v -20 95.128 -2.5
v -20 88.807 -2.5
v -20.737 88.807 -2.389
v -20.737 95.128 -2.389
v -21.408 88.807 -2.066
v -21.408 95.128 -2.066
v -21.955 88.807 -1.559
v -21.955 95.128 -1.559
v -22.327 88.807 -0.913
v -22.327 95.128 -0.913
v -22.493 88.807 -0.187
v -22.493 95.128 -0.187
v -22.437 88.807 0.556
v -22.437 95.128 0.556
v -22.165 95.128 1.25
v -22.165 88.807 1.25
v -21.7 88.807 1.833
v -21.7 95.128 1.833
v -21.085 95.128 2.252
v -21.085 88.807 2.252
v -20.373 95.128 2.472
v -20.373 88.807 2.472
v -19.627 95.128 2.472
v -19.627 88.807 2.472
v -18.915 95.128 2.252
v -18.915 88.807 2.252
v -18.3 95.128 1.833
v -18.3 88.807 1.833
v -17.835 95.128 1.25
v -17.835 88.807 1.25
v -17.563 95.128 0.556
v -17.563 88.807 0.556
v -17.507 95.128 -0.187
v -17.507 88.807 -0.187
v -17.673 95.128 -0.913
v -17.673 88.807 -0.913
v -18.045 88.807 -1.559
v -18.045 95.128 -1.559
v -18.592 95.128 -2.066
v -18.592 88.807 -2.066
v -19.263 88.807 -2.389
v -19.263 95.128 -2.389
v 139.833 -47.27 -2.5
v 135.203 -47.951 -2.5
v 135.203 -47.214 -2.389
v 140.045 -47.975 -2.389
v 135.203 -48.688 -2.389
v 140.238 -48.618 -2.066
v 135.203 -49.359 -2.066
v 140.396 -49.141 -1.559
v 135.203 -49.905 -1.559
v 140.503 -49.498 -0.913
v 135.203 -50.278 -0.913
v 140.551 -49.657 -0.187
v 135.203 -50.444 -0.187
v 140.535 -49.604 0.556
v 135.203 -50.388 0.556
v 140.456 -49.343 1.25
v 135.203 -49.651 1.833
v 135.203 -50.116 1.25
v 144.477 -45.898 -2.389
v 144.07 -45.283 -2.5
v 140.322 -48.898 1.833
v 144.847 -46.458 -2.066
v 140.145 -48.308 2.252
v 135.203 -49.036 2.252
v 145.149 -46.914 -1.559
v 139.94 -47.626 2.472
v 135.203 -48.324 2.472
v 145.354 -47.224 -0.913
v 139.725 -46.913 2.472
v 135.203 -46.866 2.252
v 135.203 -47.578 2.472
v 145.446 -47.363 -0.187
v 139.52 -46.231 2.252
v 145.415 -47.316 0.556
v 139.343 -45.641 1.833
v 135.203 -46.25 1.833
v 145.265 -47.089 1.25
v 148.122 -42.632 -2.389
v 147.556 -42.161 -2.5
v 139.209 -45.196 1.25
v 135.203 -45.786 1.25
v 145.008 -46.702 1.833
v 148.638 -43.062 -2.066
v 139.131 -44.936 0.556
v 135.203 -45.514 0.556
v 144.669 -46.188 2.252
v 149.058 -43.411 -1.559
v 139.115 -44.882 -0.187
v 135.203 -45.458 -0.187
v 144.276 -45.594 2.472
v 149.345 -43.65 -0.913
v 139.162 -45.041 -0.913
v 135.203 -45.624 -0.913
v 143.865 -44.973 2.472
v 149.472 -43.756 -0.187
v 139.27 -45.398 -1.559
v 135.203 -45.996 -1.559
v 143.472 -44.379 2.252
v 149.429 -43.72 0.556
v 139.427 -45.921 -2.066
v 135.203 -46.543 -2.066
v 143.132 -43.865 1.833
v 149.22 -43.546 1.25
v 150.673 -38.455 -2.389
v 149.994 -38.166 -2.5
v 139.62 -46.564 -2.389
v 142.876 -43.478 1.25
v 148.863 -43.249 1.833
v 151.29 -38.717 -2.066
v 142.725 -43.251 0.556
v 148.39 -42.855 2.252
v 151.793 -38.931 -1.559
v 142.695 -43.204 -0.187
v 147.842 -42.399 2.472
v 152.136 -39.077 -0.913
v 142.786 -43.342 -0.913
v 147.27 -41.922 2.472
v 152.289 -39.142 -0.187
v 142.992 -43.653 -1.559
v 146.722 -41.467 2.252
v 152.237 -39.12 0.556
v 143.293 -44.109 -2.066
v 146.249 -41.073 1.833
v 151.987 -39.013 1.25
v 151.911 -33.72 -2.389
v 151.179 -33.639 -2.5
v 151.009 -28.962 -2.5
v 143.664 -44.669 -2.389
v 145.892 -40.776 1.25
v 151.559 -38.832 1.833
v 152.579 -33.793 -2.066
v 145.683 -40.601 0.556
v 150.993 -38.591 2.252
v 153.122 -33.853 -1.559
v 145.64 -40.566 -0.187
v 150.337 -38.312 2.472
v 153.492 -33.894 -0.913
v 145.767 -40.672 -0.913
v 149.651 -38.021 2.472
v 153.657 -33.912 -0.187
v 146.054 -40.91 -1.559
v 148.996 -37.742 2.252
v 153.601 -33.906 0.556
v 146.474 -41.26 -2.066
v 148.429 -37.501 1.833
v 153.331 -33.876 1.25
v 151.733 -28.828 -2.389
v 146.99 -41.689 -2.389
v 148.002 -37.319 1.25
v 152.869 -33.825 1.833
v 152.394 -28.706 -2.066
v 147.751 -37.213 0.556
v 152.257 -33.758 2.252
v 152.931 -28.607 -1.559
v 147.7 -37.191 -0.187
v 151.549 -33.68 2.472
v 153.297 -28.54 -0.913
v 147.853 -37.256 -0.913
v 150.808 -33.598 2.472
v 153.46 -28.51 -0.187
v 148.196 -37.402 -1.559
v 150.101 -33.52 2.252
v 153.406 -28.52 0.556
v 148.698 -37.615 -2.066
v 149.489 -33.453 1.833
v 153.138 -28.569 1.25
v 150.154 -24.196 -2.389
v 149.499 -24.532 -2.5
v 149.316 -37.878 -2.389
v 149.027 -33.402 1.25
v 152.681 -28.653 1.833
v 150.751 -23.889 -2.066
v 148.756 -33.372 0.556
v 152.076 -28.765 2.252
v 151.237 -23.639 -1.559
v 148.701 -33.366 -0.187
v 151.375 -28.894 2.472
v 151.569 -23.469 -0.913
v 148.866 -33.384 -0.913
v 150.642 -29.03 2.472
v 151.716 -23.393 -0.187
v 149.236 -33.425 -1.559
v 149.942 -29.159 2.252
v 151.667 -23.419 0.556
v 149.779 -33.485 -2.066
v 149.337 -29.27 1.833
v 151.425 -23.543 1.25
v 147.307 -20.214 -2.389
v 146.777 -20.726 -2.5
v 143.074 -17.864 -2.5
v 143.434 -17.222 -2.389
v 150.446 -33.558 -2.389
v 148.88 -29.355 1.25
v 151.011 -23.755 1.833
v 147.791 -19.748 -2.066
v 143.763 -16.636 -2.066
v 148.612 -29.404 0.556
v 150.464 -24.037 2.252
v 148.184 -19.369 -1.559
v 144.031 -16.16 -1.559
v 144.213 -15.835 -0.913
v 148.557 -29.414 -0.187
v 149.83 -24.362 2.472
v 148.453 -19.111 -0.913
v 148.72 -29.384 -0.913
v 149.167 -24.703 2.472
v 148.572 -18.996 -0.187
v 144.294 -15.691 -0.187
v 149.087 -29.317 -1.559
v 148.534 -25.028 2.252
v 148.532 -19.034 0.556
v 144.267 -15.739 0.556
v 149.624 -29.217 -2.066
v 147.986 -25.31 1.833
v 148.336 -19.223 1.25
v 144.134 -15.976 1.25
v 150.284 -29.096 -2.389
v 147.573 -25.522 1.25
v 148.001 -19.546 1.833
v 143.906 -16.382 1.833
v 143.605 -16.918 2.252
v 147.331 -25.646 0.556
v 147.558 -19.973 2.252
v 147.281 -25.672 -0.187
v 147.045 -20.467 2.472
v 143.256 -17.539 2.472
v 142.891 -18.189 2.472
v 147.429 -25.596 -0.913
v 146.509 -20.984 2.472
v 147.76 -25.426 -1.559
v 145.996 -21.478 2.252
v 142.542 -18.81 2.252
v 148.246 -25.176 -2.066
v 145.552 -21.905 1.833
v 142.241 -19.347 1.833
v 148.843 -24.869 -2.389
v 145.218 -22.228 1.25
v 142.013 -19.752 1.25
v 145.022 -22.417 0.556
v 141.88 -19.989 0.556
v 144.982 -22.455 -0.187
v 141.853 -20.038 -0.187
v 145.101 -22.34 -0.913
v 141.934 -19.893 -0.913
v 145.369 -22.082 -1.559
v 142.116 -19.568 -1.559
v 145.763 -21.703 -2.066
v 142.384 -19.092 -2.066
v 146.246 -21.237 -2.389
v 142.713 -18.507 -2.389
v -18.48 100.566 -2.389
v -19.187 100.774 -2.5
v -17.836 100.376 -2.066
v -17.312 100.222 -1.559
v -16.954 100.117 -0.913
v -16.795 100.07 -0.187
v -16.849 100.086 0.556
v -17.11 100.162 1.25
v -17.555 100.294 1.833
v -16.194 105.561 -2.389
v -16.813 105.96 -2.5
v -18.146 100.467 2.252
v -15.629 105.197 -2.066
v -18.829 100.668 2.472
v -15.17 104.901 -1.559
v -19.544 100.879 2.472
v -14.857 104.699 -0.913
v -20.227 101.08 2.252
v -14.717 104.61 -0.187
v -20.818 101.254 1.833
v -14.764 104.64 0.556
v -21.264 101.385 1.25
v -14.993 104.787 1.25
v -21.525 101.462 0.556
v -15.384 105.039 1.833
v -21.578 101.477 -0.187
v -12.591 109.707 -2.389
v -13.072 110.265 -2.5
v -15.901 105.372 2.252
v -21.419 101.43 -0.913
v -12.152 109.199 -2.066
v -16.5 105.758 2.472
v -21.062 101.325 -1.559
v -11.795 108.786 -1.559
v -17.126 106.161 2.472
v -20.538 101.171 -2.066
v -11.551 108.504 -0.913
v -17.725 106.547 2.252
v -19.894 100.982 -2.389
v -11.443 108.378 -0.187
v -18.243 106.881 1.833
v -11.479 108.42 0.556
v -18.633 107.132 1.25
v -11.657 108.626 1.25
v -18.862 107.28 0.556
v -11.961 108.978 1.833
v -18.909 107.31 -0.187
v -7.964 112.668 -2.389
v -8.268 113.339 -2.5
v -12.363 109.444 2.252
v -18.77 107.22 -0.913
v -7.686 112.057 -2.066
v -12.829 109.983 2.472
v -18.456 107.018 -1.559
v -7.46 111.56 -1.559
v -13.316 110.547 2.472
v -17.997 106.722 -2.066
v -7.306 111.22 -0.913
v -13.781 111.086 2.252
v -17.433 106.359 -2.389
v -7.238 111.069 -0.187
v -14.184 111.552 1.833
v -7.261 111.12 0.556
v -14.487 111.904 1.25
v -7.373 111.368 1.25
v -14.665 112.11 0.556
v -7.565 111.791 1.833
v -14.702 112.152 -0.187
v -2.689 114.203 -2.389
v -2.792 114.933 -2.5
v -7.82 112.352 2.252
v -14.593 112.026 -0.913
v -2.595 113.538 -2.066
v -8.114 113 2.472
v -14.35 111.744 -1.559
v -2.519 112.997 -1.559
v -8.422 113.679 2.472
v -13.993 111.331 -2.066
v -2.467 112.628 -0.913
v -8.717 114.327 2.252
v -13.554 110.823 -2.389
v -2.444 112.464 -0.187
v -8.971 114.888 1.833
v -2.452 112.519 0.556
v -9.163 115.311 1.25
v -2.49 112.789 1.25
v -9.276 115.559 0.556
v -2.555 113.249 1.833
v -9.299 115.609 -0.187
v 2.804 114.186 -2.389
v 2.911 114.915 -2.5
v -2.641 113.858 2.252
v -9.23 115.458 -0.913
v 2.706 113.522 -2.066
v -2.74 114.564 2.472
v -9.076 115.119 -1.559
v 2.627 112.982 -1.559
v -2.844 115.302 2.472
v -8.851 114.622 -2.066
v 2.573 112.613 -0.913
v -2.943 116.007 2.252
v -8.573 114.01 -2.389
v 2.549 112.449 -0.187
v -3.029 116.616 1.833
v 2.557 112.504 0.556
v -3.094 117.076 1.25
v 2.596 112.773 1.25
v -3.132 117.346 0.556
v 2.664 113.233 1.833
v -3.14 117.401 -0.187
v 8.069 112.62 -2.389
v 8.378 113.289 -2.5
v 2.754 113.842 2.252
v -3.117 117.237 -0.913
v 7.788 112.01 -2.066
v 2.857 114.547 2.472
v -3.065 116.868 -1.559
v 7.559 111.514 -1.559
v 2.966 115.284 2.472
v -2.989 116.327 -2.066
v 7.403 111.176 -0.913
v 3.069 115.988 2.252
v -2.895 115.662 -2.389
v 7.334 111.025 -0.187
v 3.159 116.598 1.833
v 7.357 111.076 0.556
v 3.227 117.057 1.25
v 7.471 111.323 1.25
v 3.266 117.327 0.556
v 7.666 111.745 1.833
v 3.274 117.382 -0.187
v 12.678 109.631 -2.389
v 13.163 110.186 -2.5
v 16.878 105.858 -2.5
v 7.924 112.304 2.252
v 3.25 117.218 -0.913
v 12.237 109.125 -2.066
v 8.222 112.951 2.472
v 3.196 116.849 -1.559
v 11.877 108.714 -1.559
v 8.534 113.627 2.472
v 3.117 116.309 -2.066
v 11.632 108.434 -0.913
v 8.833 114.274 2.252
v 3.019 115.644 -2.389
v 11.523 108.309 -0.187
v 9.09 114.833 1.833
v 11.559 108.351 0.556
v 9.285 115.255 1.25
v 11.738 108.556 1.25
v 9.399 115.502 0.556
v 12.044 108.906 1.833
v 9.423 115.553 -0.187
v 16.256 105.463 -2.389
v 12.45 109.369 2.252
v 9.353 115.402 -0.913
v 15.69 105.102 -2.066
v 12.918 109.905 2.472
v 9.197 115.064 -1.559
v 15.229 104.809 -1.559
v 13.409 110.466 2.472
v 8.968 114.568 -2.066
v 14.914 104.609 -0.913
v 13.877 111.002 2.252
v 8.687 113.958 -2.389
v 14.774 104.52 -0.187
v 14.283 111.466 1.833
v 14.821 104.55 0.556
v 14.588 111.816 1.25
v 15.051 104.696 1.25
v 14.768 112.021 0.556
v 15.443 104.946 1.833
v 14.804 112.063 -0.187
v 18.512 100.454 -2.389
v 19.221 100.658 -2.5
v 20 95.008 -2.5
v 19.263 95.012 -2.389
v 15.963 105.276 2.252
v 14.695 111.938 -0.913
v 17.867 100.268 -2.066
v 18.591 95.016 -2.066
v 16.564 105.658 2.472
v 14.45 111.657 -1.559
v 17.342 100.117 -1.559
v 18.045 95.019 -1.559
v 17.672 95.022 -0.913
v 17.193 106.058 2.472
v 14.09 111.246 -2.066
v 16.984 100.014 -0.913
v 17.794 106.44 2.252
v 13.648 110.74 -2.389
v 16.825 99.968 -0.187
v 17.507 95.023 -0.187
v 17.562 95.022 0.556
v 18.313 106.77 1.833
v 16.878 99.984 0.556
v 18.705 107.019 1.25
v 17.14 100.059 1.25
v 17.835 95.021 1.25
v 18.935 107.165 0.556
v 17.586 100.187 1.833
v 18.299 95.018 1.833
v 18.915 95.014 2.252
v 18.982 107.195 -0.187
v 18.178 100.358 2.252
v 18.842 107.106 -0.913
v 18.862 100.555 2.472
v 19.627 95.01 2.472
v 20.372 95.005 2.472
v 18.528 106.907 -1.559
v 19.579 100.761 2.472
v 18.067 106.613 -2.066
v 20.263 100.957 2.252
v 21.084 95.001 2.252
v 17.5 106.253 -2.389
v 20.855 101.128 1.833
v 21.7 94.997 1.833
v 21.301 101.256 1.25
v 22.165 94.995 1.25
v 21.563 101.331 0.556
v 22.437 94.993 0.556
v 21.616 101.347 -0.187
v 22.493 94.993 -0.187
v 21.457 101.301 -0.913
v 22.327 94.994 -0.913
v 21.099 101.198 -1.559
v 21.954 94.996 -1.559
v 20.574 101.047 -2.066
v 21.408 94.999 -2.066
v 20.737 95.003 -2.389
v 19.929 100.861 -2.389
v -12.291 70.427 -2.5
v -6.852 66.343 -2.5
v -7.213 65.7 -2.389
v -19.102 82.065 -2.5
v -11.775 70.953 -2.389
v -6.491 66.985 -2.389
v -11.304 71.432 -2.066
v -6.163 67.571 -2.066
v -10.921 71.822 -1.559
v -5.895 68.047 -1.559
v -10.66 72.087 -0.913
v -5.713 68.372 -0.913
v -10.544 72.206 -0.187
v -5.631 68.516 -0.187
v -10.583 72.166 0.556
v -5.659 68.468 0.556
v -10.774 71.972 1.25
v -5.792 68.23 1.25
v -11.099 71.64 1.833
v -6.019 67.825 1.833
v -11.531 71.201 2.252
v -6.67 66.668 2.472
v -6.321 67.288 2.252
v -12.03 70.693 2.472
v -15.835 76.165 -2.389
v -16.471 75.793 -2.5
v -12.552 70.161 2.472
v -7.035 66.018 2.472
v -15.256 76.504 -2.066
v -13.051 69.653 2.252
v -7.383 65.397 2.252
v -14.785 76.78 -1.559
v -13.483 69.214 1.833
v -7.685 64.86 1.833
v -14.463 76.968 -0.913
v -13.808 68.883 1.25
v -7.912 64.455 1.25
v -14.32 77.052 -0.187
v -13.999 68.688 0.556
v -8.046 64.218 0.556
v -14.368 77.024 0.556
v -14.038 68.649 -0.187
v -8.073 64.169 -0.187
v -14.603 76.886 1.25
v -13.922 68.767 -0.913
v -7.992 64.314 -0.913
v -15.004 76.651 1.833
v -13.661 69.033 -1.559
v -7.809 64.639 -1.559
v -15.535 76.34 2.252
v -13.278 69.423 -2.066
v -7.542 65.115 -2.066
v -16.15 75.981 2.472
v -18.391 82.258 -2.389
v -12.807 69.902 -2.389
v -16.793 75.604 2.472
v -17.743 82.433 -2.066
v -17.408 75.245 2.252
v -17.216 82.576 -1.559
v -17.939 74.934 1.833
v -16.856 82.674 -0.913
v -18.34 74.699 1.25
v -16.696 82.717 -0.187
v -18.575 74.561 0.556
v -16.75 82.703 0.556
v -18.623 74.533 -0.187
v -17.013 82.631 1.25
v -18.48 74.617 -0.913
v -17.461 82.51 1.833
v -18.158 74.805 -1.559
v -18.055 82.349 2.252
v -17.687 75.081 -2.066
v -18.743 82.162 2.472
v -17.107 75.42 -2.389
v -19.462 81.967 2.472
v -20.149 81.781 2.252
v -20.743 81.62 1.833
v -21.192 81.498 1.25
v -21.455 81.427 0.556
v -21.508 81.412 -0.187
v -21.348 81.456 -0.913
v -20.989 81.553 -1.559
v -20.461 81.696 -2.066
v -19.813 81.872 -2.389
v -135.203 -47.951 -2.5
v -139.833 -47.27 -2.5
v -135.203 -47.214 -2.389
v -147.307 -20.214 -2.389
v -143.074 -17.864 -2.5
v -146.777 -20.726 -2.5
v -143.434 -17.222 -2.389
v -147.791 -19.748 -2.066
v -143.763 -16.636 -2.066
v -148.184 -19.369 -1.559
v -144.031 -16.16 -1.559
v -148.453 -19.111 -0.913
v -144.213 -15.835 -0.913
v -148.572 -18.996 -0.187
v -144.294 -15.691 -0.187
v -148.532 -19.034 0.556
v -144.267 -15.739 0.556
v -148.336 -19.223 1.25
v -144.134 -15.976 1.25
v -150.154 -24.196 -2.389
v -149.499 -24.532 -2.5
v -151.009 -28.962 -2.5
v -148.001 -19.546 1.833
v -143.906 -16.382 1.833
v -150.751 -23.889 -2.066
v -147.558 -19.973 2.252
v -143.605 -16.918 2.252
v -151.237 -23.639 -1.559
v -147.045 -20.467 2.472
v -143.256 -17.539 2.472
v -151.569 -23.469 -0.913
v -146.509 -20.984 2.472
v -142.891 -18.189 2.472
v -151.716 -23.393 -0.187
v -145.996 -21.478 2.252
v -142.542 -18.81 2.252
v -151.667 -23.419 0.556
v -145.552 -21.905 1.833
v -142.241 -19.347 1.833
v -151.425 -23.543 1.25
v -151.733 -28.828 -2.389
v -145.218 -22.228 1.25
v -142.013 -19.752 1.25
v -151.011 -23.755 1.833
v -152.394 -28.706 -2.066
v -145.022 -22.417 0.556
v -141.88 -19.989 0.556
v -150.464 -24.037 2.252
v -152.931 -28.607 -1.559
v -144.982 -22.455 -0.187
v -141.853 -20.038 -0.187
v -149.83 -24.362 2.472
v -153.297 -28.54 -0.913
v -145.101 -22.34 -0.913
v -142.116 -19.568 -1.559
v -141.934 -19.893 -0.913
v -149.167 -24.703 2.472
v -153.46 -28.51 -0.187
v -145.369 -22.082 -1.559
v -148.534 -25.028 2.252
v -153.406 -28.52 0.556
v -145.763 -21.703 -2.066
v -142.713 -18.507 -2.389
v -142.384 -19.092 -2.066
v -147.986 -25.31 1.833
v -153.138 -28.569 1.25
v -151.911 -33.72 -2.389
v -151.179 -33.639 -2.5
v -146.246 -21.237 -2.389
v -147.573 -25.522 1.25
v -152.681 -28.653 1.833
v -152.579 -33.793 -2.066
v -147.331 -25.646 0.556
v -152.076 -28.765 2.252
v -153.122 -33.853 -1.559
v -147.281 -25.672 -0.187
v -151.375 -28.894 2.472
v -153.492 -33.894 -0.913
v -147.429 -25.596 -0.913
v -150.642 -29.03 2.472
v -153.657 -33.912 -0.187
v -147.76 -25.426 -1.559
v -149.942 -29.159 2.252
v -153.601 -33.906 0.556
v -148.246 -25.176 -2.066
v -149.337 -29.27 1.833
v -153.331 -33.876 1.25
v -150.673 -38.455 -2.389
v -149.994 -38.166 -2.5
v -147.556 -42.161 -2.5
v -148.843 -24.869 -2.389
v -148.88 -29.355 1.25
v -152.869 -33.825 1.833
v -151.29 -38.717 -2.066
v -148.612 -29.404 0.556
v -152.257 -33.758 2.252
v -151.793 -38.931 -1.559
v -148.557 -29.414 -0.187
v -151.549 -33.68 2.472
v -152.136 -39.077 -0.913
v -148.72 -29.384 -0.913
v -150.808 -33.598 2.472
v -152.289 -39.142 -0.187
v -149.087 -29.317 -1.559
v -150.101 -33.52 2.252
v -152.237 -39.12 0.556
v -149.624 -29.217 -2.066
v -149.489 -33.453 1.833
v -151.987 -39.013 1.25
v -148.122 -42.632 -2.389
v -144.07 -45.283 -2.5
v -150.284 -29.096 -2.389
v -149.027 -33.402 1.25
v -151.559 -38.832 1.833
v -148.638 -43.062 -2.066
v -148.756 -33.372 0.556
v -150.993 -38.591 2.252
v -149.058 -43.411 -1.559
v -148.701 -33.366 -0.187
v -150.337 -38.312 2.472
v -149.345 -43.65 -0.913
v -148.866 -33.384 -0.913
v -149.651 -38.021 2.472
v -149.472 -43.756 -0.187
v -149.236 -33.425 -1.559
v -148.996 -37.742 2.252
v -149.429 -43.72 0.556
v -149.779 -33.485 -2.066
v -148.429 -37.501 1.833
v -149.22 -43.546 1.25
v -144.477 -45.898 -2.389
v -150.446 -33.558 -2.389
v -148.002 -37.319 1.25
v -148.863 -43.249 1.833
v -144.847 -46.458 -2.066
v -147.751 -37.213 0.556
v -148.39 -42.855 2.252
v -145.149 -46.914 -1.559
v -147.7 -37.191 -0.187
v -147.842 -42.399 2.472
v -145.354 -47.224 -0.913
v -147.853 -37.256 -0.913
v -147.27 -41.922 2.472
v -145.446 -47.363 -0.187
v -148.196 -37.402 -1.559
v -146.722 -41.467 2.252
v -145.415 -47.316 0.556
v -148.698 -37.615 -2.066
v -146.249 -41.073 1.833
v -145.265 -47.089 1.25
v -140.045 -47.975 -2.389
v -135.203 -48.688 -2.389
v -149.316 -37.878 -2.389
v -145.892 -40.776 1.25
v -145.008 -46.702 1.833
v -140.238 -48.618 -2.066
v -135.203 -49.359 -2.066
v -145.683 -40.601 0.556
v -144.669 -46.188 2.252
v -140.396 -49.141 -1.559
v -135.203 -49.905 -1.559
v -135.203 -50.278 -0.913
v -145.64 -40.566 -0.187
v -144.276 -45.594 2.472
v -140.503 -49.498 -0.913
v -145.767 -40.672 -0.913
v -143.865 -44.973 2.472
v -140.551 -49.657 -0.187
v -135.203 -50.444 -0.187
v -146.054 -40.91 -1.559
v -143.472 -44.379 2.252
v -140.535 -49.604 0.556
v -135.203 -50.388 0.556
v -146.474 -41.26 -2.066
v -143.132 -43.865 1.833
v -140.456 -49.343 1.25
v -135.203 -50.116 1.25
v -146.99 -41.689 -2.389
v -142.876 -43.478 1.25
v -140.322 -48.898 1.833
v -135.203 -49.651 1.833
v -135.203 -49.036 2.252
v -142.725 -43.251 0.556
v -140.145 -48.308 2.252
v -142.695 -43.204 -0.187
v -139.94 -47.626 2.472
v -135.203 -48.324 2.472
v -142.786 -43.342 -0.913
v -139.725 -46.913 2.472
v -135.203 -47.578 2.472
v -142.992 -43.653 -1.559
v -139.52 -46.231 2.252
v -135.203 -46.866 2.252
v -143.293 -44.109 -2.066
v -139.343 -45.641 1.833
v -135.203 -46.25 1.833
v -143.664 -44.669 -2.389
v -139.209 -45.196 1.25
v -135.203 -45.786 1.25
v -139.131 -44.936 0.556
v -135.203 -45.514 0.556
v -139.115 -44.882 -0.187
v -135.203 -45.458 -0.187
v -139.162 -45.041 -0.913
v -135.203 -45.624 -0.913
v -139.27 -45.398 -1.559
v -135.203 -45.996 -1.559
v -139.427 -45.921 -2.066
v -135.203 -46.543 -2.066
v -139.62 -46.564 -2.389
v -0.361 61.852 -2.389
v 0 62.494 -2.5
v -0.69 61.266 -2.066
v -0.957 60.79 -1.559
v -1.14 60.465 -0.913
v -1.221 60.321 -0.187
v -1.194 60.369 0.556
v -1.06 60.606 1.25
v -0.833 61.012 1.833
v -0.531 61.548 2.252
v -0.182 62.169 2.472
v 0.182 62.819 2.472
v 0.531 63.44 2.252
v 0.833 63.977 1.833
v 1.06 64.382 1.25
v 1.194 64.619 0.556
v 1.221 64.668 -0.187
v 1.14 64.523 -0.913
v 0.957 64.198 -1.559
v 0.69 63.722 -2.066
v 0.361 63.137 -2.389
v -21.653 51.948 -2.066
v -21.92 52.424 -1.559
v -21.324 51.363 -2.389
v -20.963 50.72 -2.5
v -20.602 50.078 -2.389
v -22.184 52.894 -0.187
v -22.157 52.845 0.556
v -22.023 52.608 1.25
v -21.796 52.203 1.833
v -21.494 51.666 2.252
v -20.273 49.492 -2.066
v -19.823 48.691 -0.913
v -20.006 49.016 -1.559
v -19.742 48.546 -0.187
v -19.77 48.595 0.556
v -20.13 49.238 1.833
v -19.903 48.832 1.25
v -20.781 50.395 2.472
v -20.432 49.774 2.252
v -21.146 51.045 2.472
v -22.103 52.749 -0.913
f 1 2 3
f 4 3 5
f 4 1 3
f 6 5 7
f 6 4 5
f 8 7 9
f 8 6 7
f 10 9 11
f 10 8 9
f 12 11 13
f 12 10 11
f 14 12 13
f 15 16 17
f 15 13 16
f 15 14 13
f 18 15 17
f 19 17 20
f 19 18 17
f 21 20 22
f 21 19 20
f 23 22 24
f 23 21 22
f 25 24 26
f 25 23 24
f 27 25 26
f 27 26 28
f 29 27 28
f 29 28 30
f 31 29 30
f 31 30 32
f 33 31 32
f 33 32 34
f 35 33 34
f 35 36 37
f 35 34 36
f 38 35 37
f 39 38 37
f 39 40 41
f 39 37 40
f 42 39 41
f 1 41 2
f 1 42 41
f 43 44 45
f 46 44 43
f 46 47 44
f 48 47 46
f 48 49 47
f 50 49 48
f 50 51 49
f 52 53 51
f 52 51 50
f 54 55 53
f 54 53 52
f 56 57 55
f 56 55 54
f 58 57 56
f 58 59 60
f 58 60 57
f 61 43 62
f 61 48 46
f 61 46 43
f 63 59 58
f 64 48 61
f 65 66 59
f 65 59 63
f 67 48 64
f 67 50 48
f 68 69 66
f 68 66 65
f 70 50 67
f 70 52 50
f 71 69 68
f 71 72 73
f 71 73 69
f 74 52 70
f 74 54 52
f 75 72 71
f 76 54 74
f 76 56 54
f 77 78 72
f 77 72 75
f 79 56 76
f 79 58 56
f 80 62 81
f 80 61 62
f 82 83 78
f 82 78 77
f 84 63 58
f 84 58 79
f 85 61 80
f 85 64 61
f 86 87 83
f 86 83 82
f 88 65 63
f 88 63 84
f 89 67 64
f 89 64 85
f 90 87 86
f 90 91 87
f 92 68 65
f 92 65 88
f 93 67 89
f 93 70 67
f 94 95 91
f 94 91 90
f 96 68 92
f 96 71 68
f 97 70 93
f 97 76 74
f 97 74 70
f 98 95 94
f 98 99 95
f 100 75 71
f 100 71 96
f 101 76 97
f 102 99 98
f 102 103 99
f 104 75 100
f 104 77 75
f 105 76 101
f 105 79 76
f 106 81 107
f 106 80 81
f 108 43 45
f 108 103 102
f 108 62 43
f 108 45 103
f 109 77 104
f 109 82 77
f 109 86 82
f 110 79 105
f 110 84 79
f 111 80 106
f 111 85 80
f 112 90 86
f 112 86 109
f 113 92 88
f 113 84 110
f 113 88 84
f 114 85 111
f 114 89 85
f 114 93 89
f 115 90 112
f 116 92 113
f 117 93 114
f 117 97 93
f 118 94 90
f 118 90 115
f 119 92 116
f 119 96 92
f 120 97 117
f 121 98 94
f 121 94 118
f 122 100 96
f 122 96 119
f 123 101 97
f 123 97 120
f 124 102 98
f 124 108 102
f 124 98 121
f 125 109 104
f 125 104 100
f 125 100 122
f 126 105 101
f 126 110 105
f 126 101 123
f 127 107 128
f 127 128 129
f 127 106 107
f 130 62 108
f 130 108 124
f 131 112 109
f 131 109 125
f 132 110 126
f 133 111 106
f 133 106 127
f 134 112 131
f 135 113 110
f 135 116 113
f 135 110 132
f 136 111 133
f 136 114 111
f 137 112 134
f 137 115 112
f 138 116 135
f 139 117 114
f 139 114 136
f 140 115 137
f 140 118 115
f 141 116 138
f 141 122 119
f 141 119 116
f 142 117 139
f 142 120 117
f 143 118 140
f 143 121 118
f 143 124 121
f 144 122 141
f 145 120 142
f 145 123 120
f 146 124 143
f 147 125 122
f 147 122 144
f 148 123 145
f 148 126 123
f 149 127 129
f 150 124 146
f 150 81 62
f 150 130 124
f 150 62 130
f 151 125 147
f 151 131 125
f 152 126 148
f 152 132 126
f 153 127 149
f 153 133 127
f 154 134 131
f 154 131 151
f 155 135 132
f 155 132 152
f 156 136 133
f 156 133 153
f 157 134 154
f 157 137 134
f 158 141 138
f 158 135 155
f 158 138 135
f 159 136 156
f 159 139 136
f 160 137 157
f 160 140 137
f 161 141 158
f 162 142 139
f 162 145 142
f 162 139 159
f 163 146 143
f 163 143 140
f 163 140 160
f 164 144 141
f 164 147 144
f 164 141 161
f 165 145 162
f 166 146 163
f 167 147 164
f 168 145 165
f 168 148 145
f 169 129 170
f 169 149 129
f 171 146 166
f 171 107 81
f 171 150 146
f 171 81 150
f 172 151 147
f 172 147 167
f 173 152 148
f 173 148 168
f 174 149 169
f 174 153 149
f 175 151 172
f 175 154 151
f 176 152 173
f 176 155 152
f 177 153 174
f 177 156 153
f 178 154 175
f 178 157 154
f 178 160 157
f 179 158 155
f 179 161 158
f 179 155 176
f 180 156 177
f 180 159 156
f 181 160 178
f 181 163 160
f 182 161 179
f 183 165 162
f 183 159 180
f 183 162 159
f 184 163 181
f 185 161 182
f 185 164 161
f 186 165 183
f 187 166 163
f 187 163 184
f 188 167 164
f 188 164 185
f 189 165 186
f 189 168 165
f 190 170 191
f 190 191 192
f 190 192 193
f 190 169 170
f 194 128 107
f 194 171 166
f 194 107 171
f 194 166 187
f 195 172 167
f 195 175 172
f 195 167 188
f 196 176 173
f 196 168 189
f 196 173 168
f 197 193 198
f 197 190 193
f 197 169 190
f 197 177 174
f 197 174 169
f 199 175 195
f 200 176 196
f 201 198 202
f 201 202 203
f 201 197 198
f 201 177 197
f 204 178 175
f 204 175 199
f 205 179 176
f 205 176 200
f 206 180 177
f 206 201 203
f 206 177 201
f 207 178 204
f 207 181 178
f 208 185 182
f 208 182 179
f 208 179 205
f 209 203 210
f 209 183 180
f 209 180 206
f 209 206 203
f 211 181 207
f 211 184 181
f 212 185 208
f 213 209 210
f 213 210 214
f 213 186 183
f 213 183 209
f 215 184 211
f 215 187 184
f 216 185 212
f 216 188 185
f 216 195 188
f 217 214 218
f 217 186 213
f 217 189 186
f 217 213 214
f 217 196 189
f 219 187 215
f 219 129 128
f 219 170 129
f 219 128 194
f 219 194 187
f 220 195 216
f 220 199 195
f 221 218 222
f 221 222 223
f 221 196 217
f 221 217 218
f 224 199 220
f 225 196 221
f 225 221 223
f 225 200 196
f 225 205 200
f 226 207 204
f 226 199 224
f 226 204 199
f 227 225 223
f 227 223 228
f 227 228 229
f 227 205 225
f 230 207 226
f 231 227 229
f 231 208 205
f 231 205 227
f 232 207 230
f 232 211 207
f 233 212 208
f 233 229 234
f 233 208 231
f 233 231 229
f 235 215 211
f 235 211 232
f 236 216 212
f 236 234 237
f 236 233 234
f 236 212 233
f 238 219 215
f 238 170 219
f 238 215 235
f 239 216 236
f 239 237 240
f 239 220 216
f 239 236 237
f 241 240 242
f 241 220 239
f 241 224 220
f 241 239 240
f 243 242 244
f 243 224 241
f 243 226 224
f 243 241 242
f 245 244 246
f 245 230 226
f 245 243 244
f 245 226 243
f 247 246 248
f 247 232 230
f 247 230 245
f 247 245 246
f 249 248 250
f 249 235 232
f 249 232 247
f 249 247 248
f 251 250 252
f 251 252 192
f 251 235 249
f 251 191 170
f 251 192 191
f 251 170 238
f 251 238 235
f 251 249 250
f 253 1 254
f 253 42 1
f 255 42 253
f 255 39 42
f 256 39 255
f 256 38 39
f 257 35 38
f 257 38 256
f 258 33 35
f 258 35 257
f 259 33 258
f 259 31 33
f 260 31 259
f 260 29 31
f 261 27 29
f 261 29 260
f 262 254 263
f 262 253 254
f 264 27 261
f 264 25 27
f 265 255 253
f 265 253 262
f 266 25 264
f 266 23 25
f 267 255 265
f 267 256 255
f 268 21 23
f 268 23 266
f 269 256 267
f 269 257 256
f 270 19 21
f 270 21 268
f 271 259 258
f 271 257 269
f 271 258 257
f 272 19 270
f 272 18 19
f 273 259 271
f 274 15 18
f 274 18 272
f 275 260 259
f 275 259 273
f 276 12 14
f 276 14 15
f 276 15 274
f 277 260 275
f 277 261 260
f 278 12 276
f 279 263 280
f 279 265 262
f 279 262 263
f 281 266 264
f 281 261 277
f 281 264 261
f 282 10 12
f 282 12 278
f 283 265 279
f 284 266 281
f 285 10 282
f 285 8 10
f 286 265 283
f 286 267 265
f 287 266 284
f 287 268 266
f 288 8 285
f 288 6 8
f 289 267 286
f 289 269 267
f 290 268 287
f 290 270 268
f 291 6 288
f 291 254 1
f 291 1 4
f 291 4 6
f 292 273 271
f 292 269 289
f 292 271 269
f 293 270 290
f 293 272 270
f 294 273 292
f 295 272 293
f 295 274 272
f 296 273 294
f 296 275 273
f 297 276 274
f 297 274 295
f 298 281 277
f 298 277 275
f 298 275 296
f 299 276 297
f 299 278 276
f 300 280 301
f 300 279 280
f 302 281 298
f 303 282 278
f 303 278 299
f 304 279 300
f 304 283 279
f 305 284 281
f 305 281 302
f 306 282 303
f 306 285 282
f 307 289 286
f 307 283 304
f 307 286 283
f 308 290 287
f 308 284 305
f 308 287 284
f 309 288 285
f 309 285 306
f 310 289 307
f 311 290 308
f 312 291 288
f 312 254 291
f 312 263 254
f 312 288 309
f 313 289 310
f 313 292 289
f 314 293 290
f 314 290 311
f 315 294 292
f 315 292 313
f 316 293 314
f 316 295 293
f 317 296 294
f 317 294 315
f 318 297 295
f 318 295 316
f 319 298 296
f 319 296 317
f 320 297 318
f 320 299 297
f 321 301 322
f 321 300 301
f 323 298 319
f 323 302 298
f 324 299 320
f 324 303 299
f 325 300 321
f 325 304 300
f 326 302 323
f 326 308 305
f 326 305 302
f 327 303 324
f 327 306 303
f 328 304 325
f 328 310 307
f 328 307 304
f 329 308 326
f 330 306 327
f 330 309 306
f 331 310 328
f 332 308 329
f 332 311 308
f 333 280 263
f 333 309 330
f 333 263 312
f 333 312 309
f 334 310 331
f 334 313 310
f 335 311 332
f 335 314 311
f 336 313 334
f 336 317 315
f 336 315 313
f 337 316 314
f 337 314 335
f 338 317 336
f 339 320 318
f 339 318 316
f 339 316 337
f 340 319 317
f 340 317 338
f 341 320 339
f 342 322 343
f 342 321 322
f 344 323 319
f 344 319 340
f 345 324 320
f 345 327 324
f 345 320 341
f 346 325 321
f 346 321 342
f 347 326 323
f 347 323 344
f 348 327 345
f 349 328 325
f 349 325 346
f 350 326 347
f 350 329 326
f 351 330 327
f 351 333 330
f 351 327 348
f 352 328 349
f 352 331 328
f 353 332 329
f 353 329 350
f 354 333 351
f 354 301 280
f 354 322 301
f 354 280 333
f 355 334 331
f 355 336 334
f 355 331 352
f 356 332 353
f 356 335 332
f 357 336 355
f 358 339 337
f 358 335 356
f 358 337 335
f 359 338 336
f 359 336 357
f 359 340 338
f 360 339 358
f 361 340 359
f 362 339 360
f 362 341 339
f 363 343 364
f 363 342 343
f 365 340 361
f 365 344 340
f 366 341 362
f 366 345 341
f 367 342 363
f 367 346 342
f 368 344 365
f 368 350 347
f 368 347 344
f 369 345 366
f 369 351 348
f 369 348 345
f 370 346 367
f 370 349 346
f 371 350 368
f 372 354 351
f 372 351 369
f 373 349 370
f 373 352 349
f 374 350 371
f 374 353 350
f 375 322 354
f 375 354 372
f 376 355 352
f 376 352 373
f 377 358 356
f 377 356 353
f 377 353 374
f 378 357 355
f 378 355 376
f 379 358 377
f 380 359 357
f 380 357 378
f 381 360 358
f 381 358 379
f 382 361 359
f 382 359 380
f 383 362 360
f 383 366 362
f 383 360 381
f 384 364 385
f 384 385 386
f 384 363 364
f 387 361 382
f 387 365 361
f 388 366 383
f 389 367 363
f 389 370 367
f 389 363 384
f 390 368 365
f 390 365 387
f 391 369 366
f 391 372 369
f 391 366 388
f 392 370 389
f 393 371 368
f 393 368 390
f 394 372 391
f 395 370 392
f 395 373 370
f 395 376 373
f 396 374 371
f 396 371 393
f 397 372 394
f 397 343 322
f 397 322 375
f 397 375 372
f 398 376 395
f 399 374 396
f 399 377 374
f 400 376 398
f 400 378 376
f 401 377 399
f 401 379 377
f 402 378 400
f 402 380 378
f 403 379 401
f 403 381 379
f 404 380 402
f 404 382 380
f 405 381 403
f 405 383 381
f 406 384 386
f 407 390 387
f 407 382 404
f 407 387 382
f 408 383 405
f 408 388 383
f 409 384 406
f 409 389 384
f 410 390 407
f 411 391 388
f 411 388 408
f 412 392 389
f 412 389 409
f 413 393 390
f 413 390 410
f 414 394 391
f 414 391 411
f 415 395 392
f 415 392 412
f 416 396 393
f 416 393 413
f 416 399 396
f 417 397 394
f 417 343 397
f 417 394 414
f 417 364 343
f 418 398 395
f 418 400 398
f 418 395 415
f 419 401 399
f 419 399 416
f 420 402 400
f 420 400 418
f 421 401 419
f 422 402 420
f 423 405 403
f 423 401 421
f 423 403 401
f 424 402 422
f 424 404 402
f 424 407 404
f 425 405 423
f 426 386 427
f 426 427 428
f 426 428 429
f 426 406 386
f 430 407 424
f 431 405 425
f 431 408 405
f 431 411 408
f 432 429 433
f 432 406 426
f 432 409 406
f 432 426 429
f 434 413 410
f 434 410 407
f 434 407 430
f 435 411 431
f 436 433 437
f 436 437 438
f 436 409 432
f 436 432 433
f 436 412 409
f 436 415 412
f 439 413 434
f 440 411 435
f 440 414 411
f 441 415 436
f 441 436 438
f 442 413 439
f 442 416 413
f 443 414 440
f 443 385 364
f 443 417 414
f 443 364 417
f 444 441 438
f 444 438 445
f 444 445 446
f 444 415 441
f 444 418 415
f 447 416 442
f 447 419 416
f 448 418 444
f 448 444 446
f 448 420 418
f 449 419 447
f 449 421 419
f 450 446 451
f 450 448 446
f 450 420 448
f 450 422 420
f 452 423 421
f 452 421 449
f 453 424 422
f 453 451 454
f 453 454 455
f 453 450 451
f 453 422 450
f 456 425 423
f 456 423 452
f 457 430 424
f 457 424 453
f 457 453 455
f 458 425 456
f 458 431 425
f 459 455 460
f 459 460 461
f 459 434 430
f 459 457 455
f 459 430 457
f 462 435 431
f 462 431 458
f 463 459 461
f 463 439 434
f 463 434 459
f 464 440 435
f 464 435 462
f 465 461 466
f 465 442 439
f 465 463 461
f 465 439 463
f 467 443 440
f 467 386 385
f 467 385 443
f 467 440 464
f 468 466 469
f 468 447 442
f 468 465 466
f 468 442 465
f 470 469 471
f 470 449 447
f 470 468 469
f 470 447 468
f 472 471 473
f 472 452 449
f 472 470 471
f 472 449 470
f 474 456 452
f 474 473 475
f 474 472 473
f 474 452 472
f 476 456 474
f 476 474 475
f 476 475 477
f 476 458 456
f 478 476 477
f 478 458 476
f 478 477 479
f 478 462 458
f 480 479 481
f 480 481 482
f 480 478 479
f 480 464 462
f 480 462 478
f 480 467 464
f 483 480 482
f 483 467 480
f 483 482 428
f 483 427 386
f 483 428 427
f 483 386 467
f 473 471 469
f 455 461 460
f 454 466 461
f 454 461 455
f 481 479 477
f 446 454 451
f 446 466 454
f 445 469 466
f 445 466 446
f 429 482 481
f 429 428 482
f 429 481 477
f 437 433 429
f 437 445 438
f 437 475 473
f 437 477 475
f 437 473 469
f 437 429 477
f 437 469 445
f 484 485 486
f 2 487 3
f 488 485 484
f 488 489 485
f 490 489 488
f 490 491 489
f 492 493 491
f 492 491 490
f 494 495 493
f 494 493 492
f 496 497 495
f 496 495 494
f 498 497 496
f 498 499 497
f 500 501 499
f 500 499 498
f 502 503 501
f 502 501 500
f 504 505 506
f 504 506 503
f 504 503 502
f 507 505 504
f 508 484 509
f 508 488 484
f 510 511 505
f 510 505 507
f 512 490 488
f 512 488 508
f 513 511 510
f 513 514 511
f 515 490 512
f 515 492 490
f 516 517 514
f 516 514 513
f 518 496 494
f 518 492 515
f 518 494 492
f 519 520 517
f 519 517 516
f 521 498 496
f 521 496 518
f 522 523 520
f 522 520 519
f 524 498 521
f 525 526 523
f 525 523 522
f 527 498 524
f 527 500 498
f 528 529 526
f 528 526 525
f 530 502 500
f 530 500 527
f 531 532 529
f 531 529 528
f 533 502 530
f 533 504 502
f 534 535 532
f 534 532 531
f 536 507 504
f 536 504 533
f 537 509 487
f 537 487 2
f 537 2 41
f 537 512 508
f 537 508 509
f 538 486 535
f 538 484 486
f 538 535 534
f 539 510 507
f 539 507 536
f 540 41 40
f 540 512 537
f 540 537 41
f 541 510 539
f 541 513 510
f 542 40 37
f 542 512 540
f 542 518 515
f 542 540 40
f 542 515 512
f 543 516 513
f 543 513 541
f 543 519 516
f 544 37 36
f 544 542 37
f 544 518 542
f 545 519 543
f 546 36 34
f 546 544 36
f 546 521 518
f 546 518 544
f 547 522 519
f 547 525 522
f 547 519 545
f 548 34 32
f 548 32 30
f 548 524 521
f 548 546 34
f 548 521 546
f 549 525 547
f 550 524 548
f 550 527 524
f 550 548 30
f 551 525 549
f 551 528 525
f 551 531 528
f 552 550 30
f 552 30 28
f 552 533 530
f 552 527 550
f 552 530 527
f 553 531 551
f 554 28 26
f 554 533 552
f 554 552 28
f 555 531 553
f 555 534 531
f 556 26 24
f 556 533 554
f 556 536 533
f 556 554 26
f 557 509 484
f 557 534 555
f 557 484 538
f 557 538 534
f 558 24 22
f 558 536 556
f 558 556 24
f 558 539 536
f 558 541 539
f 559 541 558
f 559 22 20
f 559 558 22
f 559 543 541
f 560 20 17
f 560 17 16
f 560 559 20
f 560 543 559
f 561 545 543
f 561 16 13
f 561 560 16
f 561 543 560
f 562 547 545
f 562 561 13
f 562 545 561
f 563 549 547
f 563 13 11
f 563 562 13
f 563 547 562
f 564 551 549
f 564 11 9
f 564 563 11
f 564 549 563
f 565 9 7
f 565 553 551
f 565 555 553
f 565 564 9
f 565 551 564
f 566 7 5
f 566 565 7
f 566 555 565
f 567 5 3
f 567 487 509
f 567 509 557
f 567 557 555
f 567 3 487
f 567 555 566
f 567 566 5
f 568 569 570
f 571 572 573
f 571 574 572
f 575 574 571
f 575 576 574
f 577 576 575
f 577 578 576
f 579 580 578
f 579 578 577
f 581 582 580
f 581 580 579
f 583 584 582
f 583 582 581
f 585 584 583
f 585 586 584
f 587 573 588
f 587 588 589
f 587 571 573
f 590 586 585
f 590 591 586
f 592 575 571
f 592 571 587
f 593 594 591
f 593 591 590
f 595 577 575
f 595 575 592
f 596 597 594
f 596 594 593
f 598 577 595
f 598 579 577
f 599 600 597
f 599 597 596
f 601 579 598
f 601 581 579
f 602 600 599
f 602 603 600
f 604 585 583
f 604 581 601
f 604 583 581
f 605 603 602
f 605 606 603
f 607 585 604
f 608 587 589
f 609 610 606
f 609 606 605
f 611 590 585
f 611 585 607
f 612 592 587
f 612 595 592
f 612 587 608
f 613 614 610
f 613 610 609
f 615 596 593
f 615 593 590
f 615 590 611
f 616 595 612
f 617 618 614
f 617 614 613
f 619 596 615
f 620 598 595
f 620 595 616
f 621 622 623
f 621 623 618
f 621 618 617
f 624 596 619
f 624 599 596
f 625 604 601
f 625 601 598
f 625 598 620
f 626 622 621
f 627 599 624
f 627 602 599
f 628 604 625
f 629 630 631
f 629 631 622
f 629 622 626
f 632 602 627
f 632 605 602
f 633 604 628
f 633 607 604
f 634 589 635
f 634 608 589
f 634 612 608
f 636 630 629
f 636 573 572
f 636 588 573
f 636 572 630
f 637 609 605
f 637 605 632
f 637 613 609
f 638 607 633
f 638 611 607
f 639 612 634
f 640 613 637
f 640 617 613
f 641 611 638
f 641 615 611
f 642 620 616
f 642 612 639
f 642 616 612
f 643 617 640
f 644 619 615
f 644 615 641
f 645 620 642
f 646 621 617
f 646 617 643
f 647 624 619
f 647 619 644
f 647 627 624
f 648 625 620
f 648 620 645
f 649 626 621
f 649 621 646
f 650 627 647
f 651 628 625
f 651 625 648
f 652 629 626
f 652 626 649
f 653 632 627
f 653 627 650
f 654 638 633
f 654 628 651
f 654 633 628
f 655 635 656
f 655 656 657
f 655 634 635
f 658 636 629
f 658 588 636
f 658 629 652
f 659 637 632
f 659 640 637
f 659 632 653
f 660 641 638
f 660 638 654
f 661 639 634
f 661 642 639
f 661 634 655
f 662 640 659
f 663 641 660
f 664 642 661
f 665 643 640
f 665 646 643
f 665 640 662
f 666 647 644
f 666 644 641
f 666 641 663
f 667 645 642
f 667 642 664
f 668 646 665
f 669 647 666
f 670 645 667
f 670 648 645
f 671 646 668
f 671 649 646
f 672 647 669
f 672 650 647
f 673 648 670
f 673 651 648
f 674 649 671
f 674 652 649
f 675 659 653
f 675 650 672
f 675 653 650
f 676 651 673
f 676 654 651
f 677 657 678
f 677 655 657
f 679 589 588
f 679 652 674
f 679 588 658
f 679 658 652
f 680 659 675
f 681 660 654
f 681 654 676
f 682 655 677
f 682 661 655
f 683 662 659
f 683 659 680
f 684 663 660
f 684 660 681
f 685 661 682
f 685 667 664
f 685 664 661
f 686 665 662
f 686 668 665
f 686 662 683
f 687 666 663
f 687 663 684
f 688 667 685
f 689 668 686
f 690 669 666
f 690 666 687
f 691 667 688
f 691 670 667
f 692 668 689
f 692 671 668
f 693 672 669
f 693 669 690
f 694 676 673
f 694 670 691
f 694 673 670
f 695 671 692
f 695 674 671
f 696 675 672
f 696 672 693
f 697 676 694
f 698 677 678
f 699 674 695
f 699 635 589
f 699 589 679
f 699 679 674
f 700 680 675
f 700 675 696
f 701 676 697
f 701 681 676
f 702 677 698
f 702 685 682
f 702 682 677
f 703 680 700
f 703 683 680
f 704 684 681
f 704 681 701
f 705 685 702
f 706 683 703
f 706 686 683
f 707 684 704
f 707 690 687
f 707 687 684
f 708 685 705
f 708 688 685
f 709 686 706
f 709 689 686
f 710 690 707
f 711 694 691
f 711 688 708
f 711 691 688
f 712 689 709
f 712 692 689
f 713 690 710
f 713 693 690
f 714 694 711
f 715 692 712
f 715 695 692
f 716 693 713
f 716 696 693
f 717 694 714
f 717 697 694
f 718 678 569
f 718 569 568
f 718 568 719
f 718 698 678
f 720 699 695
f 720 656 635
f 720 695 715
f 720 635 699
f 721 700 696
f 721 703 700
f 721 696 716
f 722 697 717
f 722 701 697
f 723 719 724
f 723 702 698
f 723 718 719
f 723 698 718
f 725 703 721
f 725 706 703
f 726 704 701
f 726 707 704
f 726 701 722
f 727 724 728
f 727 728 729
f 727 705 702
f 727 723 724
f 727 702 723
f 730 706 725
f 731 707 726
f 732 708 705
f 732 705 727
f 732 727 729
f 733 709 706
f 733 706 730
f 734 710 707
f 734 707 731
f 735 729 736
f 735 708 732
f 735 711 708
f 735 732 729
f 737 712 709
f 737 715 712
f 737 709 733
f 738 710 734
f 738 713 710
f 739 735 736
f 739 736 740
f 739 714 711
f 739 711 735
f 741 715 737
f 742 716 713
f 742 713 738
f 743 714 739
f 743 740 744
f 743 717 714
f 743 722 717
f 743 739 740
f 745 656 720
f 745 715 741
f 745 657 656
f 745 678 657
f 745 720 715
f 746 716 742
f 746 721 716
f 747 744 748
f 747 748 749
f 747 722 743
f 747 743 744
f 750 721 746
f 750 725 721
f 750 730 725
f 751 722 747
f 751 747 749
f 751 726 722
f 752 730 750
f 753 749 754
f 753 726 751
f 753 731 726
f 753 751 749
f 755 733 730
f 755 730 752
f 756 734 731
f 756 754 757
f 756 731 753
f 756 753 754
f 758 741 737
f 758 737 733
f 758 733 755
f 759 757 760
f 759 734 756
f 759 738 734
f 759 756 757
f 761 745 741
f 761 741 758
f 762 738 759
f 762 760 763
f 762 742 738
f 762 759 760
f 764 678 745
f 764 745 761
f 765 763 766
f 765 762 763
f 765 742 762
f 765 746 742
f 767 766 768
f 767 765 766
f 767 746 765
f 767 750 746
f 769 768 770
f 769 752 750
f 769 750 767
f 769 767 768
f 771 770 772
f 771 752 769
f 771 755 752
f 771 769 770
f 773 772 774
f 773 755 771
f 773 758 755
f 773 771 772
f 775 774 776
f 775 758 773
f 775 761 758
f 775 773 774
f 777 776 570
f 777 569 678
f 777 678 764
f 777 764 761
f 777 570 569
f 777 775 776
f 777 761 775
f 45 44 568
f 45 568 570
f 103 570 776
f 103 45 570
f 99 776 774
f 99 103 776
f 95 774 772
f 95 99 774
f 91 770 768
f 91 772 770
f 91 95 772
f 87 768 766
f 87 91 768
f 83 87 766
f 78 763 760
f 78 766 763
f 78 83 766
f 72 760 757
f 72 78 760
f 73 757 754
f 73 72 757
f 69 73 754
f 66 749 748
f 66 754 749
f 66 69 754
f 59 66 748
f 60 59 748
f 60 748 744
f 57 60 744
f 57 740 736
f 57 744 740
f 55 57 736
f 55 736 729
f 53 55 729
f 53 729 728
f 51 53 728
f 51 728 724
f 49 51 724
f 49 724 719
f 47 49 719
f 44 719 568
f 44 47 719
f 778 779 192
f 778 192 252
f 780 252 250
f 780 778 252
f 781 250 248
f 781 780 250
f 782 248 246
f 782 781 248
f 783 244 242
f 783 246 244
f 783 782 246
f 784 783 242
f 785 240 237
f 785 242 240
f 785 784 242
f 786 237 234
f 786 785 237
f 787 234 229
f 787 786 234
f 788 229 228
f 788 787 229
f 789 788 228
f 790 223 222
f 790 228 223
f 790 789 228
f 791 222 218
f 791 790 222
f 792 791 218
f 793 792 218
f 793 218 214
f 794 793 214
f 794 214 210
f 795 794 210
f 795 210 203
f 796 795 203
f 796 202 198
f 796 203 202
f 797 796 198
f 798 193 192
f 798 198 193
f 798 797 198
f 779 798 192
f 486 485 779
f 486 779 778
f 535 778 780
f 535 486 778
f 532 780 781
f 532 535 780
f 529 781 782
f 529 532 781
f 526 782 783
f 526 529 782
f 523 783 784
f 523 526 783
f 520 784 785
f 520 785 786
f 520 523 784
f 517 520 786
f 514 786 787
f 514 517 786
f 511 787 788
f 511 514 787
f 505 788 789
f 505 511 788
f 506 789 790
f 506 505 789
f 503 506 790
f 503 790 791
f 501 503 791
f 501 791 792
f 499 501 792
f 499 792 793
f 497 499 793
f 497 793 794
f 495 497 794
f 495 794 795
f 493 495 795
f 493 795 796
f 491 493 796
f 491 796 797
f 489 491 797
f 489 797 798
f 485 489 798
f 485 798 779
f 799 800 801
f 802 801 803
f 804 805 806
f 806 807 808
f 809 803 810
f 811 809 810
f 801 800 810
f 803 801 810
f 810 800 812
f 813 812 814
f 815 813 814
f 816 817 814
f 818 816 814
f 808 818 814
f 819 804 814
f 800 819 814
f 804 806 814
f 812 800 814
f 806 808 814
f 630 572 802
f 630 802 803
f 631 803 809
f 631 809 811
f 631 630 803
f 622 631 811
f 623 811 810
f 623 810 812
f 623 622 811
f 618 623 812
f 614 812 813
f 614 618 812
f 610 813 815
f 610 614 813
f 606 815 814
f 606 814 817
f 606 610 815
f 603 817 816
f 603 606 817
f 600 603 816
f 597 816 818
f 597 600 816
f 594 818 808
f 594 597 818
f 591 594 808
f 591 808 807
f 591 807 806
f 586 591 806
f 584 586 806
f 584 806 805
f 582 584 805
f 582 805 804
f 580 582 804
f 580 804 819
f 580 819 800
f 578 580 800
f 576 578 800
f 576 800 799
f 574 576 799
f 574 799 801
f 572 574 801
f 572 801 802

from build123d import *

# Parameters (mm, degrees)
SKETCH2_R = 2.5


with BuildPart() as part:
    # Sweep1: sweep along a path in Sketch1
    with BuildLine(Plane.XY) as sweep1_path:
        Line((-20.96310132, 50.720098642), (-143.073579672, -17.864169648))
        ThreePointArc((-143.073579672, -17.864169648), (-150.752246891, -35.945906478), (-135.202616283, -47.950910641))
        Line((-135.202616283, -47.950910641), (135.202616283, -47.950910641))
        ThreePointArc((135.202616283, -47.950910641), (150.752246891, -35.945906478), (143.073579672, -17.864169648))
        Line((143.073579672, -17.864169648), (0, 62.494182115))
        Line((0, 62.494182115), (-6.85216534, 66.342752298))
        ThreePointArc((-6.85216534, 66.342752298), (-16.471417859, 75.792531042), (-20, 88.807040077))
        Line((-20, 88.807040077), (-20, 95.128388362))
        ThreePointArc((-20, 95.128388362), (0.060396069, 115.12829717), (19.999635231, 95.007596775))
    # Sketch2 → Sweep1 (sweep)
    with BuildSketch(Plane(origin=(0, 0, 0), x_dir=(0, 0, -1), z_dir=(1, 0, 0))):
        with Locations((0, -47.950910641)):
            Circle(SKETCH2_R)
    sweep(path=sweep1_path.line)


solid = part.part
